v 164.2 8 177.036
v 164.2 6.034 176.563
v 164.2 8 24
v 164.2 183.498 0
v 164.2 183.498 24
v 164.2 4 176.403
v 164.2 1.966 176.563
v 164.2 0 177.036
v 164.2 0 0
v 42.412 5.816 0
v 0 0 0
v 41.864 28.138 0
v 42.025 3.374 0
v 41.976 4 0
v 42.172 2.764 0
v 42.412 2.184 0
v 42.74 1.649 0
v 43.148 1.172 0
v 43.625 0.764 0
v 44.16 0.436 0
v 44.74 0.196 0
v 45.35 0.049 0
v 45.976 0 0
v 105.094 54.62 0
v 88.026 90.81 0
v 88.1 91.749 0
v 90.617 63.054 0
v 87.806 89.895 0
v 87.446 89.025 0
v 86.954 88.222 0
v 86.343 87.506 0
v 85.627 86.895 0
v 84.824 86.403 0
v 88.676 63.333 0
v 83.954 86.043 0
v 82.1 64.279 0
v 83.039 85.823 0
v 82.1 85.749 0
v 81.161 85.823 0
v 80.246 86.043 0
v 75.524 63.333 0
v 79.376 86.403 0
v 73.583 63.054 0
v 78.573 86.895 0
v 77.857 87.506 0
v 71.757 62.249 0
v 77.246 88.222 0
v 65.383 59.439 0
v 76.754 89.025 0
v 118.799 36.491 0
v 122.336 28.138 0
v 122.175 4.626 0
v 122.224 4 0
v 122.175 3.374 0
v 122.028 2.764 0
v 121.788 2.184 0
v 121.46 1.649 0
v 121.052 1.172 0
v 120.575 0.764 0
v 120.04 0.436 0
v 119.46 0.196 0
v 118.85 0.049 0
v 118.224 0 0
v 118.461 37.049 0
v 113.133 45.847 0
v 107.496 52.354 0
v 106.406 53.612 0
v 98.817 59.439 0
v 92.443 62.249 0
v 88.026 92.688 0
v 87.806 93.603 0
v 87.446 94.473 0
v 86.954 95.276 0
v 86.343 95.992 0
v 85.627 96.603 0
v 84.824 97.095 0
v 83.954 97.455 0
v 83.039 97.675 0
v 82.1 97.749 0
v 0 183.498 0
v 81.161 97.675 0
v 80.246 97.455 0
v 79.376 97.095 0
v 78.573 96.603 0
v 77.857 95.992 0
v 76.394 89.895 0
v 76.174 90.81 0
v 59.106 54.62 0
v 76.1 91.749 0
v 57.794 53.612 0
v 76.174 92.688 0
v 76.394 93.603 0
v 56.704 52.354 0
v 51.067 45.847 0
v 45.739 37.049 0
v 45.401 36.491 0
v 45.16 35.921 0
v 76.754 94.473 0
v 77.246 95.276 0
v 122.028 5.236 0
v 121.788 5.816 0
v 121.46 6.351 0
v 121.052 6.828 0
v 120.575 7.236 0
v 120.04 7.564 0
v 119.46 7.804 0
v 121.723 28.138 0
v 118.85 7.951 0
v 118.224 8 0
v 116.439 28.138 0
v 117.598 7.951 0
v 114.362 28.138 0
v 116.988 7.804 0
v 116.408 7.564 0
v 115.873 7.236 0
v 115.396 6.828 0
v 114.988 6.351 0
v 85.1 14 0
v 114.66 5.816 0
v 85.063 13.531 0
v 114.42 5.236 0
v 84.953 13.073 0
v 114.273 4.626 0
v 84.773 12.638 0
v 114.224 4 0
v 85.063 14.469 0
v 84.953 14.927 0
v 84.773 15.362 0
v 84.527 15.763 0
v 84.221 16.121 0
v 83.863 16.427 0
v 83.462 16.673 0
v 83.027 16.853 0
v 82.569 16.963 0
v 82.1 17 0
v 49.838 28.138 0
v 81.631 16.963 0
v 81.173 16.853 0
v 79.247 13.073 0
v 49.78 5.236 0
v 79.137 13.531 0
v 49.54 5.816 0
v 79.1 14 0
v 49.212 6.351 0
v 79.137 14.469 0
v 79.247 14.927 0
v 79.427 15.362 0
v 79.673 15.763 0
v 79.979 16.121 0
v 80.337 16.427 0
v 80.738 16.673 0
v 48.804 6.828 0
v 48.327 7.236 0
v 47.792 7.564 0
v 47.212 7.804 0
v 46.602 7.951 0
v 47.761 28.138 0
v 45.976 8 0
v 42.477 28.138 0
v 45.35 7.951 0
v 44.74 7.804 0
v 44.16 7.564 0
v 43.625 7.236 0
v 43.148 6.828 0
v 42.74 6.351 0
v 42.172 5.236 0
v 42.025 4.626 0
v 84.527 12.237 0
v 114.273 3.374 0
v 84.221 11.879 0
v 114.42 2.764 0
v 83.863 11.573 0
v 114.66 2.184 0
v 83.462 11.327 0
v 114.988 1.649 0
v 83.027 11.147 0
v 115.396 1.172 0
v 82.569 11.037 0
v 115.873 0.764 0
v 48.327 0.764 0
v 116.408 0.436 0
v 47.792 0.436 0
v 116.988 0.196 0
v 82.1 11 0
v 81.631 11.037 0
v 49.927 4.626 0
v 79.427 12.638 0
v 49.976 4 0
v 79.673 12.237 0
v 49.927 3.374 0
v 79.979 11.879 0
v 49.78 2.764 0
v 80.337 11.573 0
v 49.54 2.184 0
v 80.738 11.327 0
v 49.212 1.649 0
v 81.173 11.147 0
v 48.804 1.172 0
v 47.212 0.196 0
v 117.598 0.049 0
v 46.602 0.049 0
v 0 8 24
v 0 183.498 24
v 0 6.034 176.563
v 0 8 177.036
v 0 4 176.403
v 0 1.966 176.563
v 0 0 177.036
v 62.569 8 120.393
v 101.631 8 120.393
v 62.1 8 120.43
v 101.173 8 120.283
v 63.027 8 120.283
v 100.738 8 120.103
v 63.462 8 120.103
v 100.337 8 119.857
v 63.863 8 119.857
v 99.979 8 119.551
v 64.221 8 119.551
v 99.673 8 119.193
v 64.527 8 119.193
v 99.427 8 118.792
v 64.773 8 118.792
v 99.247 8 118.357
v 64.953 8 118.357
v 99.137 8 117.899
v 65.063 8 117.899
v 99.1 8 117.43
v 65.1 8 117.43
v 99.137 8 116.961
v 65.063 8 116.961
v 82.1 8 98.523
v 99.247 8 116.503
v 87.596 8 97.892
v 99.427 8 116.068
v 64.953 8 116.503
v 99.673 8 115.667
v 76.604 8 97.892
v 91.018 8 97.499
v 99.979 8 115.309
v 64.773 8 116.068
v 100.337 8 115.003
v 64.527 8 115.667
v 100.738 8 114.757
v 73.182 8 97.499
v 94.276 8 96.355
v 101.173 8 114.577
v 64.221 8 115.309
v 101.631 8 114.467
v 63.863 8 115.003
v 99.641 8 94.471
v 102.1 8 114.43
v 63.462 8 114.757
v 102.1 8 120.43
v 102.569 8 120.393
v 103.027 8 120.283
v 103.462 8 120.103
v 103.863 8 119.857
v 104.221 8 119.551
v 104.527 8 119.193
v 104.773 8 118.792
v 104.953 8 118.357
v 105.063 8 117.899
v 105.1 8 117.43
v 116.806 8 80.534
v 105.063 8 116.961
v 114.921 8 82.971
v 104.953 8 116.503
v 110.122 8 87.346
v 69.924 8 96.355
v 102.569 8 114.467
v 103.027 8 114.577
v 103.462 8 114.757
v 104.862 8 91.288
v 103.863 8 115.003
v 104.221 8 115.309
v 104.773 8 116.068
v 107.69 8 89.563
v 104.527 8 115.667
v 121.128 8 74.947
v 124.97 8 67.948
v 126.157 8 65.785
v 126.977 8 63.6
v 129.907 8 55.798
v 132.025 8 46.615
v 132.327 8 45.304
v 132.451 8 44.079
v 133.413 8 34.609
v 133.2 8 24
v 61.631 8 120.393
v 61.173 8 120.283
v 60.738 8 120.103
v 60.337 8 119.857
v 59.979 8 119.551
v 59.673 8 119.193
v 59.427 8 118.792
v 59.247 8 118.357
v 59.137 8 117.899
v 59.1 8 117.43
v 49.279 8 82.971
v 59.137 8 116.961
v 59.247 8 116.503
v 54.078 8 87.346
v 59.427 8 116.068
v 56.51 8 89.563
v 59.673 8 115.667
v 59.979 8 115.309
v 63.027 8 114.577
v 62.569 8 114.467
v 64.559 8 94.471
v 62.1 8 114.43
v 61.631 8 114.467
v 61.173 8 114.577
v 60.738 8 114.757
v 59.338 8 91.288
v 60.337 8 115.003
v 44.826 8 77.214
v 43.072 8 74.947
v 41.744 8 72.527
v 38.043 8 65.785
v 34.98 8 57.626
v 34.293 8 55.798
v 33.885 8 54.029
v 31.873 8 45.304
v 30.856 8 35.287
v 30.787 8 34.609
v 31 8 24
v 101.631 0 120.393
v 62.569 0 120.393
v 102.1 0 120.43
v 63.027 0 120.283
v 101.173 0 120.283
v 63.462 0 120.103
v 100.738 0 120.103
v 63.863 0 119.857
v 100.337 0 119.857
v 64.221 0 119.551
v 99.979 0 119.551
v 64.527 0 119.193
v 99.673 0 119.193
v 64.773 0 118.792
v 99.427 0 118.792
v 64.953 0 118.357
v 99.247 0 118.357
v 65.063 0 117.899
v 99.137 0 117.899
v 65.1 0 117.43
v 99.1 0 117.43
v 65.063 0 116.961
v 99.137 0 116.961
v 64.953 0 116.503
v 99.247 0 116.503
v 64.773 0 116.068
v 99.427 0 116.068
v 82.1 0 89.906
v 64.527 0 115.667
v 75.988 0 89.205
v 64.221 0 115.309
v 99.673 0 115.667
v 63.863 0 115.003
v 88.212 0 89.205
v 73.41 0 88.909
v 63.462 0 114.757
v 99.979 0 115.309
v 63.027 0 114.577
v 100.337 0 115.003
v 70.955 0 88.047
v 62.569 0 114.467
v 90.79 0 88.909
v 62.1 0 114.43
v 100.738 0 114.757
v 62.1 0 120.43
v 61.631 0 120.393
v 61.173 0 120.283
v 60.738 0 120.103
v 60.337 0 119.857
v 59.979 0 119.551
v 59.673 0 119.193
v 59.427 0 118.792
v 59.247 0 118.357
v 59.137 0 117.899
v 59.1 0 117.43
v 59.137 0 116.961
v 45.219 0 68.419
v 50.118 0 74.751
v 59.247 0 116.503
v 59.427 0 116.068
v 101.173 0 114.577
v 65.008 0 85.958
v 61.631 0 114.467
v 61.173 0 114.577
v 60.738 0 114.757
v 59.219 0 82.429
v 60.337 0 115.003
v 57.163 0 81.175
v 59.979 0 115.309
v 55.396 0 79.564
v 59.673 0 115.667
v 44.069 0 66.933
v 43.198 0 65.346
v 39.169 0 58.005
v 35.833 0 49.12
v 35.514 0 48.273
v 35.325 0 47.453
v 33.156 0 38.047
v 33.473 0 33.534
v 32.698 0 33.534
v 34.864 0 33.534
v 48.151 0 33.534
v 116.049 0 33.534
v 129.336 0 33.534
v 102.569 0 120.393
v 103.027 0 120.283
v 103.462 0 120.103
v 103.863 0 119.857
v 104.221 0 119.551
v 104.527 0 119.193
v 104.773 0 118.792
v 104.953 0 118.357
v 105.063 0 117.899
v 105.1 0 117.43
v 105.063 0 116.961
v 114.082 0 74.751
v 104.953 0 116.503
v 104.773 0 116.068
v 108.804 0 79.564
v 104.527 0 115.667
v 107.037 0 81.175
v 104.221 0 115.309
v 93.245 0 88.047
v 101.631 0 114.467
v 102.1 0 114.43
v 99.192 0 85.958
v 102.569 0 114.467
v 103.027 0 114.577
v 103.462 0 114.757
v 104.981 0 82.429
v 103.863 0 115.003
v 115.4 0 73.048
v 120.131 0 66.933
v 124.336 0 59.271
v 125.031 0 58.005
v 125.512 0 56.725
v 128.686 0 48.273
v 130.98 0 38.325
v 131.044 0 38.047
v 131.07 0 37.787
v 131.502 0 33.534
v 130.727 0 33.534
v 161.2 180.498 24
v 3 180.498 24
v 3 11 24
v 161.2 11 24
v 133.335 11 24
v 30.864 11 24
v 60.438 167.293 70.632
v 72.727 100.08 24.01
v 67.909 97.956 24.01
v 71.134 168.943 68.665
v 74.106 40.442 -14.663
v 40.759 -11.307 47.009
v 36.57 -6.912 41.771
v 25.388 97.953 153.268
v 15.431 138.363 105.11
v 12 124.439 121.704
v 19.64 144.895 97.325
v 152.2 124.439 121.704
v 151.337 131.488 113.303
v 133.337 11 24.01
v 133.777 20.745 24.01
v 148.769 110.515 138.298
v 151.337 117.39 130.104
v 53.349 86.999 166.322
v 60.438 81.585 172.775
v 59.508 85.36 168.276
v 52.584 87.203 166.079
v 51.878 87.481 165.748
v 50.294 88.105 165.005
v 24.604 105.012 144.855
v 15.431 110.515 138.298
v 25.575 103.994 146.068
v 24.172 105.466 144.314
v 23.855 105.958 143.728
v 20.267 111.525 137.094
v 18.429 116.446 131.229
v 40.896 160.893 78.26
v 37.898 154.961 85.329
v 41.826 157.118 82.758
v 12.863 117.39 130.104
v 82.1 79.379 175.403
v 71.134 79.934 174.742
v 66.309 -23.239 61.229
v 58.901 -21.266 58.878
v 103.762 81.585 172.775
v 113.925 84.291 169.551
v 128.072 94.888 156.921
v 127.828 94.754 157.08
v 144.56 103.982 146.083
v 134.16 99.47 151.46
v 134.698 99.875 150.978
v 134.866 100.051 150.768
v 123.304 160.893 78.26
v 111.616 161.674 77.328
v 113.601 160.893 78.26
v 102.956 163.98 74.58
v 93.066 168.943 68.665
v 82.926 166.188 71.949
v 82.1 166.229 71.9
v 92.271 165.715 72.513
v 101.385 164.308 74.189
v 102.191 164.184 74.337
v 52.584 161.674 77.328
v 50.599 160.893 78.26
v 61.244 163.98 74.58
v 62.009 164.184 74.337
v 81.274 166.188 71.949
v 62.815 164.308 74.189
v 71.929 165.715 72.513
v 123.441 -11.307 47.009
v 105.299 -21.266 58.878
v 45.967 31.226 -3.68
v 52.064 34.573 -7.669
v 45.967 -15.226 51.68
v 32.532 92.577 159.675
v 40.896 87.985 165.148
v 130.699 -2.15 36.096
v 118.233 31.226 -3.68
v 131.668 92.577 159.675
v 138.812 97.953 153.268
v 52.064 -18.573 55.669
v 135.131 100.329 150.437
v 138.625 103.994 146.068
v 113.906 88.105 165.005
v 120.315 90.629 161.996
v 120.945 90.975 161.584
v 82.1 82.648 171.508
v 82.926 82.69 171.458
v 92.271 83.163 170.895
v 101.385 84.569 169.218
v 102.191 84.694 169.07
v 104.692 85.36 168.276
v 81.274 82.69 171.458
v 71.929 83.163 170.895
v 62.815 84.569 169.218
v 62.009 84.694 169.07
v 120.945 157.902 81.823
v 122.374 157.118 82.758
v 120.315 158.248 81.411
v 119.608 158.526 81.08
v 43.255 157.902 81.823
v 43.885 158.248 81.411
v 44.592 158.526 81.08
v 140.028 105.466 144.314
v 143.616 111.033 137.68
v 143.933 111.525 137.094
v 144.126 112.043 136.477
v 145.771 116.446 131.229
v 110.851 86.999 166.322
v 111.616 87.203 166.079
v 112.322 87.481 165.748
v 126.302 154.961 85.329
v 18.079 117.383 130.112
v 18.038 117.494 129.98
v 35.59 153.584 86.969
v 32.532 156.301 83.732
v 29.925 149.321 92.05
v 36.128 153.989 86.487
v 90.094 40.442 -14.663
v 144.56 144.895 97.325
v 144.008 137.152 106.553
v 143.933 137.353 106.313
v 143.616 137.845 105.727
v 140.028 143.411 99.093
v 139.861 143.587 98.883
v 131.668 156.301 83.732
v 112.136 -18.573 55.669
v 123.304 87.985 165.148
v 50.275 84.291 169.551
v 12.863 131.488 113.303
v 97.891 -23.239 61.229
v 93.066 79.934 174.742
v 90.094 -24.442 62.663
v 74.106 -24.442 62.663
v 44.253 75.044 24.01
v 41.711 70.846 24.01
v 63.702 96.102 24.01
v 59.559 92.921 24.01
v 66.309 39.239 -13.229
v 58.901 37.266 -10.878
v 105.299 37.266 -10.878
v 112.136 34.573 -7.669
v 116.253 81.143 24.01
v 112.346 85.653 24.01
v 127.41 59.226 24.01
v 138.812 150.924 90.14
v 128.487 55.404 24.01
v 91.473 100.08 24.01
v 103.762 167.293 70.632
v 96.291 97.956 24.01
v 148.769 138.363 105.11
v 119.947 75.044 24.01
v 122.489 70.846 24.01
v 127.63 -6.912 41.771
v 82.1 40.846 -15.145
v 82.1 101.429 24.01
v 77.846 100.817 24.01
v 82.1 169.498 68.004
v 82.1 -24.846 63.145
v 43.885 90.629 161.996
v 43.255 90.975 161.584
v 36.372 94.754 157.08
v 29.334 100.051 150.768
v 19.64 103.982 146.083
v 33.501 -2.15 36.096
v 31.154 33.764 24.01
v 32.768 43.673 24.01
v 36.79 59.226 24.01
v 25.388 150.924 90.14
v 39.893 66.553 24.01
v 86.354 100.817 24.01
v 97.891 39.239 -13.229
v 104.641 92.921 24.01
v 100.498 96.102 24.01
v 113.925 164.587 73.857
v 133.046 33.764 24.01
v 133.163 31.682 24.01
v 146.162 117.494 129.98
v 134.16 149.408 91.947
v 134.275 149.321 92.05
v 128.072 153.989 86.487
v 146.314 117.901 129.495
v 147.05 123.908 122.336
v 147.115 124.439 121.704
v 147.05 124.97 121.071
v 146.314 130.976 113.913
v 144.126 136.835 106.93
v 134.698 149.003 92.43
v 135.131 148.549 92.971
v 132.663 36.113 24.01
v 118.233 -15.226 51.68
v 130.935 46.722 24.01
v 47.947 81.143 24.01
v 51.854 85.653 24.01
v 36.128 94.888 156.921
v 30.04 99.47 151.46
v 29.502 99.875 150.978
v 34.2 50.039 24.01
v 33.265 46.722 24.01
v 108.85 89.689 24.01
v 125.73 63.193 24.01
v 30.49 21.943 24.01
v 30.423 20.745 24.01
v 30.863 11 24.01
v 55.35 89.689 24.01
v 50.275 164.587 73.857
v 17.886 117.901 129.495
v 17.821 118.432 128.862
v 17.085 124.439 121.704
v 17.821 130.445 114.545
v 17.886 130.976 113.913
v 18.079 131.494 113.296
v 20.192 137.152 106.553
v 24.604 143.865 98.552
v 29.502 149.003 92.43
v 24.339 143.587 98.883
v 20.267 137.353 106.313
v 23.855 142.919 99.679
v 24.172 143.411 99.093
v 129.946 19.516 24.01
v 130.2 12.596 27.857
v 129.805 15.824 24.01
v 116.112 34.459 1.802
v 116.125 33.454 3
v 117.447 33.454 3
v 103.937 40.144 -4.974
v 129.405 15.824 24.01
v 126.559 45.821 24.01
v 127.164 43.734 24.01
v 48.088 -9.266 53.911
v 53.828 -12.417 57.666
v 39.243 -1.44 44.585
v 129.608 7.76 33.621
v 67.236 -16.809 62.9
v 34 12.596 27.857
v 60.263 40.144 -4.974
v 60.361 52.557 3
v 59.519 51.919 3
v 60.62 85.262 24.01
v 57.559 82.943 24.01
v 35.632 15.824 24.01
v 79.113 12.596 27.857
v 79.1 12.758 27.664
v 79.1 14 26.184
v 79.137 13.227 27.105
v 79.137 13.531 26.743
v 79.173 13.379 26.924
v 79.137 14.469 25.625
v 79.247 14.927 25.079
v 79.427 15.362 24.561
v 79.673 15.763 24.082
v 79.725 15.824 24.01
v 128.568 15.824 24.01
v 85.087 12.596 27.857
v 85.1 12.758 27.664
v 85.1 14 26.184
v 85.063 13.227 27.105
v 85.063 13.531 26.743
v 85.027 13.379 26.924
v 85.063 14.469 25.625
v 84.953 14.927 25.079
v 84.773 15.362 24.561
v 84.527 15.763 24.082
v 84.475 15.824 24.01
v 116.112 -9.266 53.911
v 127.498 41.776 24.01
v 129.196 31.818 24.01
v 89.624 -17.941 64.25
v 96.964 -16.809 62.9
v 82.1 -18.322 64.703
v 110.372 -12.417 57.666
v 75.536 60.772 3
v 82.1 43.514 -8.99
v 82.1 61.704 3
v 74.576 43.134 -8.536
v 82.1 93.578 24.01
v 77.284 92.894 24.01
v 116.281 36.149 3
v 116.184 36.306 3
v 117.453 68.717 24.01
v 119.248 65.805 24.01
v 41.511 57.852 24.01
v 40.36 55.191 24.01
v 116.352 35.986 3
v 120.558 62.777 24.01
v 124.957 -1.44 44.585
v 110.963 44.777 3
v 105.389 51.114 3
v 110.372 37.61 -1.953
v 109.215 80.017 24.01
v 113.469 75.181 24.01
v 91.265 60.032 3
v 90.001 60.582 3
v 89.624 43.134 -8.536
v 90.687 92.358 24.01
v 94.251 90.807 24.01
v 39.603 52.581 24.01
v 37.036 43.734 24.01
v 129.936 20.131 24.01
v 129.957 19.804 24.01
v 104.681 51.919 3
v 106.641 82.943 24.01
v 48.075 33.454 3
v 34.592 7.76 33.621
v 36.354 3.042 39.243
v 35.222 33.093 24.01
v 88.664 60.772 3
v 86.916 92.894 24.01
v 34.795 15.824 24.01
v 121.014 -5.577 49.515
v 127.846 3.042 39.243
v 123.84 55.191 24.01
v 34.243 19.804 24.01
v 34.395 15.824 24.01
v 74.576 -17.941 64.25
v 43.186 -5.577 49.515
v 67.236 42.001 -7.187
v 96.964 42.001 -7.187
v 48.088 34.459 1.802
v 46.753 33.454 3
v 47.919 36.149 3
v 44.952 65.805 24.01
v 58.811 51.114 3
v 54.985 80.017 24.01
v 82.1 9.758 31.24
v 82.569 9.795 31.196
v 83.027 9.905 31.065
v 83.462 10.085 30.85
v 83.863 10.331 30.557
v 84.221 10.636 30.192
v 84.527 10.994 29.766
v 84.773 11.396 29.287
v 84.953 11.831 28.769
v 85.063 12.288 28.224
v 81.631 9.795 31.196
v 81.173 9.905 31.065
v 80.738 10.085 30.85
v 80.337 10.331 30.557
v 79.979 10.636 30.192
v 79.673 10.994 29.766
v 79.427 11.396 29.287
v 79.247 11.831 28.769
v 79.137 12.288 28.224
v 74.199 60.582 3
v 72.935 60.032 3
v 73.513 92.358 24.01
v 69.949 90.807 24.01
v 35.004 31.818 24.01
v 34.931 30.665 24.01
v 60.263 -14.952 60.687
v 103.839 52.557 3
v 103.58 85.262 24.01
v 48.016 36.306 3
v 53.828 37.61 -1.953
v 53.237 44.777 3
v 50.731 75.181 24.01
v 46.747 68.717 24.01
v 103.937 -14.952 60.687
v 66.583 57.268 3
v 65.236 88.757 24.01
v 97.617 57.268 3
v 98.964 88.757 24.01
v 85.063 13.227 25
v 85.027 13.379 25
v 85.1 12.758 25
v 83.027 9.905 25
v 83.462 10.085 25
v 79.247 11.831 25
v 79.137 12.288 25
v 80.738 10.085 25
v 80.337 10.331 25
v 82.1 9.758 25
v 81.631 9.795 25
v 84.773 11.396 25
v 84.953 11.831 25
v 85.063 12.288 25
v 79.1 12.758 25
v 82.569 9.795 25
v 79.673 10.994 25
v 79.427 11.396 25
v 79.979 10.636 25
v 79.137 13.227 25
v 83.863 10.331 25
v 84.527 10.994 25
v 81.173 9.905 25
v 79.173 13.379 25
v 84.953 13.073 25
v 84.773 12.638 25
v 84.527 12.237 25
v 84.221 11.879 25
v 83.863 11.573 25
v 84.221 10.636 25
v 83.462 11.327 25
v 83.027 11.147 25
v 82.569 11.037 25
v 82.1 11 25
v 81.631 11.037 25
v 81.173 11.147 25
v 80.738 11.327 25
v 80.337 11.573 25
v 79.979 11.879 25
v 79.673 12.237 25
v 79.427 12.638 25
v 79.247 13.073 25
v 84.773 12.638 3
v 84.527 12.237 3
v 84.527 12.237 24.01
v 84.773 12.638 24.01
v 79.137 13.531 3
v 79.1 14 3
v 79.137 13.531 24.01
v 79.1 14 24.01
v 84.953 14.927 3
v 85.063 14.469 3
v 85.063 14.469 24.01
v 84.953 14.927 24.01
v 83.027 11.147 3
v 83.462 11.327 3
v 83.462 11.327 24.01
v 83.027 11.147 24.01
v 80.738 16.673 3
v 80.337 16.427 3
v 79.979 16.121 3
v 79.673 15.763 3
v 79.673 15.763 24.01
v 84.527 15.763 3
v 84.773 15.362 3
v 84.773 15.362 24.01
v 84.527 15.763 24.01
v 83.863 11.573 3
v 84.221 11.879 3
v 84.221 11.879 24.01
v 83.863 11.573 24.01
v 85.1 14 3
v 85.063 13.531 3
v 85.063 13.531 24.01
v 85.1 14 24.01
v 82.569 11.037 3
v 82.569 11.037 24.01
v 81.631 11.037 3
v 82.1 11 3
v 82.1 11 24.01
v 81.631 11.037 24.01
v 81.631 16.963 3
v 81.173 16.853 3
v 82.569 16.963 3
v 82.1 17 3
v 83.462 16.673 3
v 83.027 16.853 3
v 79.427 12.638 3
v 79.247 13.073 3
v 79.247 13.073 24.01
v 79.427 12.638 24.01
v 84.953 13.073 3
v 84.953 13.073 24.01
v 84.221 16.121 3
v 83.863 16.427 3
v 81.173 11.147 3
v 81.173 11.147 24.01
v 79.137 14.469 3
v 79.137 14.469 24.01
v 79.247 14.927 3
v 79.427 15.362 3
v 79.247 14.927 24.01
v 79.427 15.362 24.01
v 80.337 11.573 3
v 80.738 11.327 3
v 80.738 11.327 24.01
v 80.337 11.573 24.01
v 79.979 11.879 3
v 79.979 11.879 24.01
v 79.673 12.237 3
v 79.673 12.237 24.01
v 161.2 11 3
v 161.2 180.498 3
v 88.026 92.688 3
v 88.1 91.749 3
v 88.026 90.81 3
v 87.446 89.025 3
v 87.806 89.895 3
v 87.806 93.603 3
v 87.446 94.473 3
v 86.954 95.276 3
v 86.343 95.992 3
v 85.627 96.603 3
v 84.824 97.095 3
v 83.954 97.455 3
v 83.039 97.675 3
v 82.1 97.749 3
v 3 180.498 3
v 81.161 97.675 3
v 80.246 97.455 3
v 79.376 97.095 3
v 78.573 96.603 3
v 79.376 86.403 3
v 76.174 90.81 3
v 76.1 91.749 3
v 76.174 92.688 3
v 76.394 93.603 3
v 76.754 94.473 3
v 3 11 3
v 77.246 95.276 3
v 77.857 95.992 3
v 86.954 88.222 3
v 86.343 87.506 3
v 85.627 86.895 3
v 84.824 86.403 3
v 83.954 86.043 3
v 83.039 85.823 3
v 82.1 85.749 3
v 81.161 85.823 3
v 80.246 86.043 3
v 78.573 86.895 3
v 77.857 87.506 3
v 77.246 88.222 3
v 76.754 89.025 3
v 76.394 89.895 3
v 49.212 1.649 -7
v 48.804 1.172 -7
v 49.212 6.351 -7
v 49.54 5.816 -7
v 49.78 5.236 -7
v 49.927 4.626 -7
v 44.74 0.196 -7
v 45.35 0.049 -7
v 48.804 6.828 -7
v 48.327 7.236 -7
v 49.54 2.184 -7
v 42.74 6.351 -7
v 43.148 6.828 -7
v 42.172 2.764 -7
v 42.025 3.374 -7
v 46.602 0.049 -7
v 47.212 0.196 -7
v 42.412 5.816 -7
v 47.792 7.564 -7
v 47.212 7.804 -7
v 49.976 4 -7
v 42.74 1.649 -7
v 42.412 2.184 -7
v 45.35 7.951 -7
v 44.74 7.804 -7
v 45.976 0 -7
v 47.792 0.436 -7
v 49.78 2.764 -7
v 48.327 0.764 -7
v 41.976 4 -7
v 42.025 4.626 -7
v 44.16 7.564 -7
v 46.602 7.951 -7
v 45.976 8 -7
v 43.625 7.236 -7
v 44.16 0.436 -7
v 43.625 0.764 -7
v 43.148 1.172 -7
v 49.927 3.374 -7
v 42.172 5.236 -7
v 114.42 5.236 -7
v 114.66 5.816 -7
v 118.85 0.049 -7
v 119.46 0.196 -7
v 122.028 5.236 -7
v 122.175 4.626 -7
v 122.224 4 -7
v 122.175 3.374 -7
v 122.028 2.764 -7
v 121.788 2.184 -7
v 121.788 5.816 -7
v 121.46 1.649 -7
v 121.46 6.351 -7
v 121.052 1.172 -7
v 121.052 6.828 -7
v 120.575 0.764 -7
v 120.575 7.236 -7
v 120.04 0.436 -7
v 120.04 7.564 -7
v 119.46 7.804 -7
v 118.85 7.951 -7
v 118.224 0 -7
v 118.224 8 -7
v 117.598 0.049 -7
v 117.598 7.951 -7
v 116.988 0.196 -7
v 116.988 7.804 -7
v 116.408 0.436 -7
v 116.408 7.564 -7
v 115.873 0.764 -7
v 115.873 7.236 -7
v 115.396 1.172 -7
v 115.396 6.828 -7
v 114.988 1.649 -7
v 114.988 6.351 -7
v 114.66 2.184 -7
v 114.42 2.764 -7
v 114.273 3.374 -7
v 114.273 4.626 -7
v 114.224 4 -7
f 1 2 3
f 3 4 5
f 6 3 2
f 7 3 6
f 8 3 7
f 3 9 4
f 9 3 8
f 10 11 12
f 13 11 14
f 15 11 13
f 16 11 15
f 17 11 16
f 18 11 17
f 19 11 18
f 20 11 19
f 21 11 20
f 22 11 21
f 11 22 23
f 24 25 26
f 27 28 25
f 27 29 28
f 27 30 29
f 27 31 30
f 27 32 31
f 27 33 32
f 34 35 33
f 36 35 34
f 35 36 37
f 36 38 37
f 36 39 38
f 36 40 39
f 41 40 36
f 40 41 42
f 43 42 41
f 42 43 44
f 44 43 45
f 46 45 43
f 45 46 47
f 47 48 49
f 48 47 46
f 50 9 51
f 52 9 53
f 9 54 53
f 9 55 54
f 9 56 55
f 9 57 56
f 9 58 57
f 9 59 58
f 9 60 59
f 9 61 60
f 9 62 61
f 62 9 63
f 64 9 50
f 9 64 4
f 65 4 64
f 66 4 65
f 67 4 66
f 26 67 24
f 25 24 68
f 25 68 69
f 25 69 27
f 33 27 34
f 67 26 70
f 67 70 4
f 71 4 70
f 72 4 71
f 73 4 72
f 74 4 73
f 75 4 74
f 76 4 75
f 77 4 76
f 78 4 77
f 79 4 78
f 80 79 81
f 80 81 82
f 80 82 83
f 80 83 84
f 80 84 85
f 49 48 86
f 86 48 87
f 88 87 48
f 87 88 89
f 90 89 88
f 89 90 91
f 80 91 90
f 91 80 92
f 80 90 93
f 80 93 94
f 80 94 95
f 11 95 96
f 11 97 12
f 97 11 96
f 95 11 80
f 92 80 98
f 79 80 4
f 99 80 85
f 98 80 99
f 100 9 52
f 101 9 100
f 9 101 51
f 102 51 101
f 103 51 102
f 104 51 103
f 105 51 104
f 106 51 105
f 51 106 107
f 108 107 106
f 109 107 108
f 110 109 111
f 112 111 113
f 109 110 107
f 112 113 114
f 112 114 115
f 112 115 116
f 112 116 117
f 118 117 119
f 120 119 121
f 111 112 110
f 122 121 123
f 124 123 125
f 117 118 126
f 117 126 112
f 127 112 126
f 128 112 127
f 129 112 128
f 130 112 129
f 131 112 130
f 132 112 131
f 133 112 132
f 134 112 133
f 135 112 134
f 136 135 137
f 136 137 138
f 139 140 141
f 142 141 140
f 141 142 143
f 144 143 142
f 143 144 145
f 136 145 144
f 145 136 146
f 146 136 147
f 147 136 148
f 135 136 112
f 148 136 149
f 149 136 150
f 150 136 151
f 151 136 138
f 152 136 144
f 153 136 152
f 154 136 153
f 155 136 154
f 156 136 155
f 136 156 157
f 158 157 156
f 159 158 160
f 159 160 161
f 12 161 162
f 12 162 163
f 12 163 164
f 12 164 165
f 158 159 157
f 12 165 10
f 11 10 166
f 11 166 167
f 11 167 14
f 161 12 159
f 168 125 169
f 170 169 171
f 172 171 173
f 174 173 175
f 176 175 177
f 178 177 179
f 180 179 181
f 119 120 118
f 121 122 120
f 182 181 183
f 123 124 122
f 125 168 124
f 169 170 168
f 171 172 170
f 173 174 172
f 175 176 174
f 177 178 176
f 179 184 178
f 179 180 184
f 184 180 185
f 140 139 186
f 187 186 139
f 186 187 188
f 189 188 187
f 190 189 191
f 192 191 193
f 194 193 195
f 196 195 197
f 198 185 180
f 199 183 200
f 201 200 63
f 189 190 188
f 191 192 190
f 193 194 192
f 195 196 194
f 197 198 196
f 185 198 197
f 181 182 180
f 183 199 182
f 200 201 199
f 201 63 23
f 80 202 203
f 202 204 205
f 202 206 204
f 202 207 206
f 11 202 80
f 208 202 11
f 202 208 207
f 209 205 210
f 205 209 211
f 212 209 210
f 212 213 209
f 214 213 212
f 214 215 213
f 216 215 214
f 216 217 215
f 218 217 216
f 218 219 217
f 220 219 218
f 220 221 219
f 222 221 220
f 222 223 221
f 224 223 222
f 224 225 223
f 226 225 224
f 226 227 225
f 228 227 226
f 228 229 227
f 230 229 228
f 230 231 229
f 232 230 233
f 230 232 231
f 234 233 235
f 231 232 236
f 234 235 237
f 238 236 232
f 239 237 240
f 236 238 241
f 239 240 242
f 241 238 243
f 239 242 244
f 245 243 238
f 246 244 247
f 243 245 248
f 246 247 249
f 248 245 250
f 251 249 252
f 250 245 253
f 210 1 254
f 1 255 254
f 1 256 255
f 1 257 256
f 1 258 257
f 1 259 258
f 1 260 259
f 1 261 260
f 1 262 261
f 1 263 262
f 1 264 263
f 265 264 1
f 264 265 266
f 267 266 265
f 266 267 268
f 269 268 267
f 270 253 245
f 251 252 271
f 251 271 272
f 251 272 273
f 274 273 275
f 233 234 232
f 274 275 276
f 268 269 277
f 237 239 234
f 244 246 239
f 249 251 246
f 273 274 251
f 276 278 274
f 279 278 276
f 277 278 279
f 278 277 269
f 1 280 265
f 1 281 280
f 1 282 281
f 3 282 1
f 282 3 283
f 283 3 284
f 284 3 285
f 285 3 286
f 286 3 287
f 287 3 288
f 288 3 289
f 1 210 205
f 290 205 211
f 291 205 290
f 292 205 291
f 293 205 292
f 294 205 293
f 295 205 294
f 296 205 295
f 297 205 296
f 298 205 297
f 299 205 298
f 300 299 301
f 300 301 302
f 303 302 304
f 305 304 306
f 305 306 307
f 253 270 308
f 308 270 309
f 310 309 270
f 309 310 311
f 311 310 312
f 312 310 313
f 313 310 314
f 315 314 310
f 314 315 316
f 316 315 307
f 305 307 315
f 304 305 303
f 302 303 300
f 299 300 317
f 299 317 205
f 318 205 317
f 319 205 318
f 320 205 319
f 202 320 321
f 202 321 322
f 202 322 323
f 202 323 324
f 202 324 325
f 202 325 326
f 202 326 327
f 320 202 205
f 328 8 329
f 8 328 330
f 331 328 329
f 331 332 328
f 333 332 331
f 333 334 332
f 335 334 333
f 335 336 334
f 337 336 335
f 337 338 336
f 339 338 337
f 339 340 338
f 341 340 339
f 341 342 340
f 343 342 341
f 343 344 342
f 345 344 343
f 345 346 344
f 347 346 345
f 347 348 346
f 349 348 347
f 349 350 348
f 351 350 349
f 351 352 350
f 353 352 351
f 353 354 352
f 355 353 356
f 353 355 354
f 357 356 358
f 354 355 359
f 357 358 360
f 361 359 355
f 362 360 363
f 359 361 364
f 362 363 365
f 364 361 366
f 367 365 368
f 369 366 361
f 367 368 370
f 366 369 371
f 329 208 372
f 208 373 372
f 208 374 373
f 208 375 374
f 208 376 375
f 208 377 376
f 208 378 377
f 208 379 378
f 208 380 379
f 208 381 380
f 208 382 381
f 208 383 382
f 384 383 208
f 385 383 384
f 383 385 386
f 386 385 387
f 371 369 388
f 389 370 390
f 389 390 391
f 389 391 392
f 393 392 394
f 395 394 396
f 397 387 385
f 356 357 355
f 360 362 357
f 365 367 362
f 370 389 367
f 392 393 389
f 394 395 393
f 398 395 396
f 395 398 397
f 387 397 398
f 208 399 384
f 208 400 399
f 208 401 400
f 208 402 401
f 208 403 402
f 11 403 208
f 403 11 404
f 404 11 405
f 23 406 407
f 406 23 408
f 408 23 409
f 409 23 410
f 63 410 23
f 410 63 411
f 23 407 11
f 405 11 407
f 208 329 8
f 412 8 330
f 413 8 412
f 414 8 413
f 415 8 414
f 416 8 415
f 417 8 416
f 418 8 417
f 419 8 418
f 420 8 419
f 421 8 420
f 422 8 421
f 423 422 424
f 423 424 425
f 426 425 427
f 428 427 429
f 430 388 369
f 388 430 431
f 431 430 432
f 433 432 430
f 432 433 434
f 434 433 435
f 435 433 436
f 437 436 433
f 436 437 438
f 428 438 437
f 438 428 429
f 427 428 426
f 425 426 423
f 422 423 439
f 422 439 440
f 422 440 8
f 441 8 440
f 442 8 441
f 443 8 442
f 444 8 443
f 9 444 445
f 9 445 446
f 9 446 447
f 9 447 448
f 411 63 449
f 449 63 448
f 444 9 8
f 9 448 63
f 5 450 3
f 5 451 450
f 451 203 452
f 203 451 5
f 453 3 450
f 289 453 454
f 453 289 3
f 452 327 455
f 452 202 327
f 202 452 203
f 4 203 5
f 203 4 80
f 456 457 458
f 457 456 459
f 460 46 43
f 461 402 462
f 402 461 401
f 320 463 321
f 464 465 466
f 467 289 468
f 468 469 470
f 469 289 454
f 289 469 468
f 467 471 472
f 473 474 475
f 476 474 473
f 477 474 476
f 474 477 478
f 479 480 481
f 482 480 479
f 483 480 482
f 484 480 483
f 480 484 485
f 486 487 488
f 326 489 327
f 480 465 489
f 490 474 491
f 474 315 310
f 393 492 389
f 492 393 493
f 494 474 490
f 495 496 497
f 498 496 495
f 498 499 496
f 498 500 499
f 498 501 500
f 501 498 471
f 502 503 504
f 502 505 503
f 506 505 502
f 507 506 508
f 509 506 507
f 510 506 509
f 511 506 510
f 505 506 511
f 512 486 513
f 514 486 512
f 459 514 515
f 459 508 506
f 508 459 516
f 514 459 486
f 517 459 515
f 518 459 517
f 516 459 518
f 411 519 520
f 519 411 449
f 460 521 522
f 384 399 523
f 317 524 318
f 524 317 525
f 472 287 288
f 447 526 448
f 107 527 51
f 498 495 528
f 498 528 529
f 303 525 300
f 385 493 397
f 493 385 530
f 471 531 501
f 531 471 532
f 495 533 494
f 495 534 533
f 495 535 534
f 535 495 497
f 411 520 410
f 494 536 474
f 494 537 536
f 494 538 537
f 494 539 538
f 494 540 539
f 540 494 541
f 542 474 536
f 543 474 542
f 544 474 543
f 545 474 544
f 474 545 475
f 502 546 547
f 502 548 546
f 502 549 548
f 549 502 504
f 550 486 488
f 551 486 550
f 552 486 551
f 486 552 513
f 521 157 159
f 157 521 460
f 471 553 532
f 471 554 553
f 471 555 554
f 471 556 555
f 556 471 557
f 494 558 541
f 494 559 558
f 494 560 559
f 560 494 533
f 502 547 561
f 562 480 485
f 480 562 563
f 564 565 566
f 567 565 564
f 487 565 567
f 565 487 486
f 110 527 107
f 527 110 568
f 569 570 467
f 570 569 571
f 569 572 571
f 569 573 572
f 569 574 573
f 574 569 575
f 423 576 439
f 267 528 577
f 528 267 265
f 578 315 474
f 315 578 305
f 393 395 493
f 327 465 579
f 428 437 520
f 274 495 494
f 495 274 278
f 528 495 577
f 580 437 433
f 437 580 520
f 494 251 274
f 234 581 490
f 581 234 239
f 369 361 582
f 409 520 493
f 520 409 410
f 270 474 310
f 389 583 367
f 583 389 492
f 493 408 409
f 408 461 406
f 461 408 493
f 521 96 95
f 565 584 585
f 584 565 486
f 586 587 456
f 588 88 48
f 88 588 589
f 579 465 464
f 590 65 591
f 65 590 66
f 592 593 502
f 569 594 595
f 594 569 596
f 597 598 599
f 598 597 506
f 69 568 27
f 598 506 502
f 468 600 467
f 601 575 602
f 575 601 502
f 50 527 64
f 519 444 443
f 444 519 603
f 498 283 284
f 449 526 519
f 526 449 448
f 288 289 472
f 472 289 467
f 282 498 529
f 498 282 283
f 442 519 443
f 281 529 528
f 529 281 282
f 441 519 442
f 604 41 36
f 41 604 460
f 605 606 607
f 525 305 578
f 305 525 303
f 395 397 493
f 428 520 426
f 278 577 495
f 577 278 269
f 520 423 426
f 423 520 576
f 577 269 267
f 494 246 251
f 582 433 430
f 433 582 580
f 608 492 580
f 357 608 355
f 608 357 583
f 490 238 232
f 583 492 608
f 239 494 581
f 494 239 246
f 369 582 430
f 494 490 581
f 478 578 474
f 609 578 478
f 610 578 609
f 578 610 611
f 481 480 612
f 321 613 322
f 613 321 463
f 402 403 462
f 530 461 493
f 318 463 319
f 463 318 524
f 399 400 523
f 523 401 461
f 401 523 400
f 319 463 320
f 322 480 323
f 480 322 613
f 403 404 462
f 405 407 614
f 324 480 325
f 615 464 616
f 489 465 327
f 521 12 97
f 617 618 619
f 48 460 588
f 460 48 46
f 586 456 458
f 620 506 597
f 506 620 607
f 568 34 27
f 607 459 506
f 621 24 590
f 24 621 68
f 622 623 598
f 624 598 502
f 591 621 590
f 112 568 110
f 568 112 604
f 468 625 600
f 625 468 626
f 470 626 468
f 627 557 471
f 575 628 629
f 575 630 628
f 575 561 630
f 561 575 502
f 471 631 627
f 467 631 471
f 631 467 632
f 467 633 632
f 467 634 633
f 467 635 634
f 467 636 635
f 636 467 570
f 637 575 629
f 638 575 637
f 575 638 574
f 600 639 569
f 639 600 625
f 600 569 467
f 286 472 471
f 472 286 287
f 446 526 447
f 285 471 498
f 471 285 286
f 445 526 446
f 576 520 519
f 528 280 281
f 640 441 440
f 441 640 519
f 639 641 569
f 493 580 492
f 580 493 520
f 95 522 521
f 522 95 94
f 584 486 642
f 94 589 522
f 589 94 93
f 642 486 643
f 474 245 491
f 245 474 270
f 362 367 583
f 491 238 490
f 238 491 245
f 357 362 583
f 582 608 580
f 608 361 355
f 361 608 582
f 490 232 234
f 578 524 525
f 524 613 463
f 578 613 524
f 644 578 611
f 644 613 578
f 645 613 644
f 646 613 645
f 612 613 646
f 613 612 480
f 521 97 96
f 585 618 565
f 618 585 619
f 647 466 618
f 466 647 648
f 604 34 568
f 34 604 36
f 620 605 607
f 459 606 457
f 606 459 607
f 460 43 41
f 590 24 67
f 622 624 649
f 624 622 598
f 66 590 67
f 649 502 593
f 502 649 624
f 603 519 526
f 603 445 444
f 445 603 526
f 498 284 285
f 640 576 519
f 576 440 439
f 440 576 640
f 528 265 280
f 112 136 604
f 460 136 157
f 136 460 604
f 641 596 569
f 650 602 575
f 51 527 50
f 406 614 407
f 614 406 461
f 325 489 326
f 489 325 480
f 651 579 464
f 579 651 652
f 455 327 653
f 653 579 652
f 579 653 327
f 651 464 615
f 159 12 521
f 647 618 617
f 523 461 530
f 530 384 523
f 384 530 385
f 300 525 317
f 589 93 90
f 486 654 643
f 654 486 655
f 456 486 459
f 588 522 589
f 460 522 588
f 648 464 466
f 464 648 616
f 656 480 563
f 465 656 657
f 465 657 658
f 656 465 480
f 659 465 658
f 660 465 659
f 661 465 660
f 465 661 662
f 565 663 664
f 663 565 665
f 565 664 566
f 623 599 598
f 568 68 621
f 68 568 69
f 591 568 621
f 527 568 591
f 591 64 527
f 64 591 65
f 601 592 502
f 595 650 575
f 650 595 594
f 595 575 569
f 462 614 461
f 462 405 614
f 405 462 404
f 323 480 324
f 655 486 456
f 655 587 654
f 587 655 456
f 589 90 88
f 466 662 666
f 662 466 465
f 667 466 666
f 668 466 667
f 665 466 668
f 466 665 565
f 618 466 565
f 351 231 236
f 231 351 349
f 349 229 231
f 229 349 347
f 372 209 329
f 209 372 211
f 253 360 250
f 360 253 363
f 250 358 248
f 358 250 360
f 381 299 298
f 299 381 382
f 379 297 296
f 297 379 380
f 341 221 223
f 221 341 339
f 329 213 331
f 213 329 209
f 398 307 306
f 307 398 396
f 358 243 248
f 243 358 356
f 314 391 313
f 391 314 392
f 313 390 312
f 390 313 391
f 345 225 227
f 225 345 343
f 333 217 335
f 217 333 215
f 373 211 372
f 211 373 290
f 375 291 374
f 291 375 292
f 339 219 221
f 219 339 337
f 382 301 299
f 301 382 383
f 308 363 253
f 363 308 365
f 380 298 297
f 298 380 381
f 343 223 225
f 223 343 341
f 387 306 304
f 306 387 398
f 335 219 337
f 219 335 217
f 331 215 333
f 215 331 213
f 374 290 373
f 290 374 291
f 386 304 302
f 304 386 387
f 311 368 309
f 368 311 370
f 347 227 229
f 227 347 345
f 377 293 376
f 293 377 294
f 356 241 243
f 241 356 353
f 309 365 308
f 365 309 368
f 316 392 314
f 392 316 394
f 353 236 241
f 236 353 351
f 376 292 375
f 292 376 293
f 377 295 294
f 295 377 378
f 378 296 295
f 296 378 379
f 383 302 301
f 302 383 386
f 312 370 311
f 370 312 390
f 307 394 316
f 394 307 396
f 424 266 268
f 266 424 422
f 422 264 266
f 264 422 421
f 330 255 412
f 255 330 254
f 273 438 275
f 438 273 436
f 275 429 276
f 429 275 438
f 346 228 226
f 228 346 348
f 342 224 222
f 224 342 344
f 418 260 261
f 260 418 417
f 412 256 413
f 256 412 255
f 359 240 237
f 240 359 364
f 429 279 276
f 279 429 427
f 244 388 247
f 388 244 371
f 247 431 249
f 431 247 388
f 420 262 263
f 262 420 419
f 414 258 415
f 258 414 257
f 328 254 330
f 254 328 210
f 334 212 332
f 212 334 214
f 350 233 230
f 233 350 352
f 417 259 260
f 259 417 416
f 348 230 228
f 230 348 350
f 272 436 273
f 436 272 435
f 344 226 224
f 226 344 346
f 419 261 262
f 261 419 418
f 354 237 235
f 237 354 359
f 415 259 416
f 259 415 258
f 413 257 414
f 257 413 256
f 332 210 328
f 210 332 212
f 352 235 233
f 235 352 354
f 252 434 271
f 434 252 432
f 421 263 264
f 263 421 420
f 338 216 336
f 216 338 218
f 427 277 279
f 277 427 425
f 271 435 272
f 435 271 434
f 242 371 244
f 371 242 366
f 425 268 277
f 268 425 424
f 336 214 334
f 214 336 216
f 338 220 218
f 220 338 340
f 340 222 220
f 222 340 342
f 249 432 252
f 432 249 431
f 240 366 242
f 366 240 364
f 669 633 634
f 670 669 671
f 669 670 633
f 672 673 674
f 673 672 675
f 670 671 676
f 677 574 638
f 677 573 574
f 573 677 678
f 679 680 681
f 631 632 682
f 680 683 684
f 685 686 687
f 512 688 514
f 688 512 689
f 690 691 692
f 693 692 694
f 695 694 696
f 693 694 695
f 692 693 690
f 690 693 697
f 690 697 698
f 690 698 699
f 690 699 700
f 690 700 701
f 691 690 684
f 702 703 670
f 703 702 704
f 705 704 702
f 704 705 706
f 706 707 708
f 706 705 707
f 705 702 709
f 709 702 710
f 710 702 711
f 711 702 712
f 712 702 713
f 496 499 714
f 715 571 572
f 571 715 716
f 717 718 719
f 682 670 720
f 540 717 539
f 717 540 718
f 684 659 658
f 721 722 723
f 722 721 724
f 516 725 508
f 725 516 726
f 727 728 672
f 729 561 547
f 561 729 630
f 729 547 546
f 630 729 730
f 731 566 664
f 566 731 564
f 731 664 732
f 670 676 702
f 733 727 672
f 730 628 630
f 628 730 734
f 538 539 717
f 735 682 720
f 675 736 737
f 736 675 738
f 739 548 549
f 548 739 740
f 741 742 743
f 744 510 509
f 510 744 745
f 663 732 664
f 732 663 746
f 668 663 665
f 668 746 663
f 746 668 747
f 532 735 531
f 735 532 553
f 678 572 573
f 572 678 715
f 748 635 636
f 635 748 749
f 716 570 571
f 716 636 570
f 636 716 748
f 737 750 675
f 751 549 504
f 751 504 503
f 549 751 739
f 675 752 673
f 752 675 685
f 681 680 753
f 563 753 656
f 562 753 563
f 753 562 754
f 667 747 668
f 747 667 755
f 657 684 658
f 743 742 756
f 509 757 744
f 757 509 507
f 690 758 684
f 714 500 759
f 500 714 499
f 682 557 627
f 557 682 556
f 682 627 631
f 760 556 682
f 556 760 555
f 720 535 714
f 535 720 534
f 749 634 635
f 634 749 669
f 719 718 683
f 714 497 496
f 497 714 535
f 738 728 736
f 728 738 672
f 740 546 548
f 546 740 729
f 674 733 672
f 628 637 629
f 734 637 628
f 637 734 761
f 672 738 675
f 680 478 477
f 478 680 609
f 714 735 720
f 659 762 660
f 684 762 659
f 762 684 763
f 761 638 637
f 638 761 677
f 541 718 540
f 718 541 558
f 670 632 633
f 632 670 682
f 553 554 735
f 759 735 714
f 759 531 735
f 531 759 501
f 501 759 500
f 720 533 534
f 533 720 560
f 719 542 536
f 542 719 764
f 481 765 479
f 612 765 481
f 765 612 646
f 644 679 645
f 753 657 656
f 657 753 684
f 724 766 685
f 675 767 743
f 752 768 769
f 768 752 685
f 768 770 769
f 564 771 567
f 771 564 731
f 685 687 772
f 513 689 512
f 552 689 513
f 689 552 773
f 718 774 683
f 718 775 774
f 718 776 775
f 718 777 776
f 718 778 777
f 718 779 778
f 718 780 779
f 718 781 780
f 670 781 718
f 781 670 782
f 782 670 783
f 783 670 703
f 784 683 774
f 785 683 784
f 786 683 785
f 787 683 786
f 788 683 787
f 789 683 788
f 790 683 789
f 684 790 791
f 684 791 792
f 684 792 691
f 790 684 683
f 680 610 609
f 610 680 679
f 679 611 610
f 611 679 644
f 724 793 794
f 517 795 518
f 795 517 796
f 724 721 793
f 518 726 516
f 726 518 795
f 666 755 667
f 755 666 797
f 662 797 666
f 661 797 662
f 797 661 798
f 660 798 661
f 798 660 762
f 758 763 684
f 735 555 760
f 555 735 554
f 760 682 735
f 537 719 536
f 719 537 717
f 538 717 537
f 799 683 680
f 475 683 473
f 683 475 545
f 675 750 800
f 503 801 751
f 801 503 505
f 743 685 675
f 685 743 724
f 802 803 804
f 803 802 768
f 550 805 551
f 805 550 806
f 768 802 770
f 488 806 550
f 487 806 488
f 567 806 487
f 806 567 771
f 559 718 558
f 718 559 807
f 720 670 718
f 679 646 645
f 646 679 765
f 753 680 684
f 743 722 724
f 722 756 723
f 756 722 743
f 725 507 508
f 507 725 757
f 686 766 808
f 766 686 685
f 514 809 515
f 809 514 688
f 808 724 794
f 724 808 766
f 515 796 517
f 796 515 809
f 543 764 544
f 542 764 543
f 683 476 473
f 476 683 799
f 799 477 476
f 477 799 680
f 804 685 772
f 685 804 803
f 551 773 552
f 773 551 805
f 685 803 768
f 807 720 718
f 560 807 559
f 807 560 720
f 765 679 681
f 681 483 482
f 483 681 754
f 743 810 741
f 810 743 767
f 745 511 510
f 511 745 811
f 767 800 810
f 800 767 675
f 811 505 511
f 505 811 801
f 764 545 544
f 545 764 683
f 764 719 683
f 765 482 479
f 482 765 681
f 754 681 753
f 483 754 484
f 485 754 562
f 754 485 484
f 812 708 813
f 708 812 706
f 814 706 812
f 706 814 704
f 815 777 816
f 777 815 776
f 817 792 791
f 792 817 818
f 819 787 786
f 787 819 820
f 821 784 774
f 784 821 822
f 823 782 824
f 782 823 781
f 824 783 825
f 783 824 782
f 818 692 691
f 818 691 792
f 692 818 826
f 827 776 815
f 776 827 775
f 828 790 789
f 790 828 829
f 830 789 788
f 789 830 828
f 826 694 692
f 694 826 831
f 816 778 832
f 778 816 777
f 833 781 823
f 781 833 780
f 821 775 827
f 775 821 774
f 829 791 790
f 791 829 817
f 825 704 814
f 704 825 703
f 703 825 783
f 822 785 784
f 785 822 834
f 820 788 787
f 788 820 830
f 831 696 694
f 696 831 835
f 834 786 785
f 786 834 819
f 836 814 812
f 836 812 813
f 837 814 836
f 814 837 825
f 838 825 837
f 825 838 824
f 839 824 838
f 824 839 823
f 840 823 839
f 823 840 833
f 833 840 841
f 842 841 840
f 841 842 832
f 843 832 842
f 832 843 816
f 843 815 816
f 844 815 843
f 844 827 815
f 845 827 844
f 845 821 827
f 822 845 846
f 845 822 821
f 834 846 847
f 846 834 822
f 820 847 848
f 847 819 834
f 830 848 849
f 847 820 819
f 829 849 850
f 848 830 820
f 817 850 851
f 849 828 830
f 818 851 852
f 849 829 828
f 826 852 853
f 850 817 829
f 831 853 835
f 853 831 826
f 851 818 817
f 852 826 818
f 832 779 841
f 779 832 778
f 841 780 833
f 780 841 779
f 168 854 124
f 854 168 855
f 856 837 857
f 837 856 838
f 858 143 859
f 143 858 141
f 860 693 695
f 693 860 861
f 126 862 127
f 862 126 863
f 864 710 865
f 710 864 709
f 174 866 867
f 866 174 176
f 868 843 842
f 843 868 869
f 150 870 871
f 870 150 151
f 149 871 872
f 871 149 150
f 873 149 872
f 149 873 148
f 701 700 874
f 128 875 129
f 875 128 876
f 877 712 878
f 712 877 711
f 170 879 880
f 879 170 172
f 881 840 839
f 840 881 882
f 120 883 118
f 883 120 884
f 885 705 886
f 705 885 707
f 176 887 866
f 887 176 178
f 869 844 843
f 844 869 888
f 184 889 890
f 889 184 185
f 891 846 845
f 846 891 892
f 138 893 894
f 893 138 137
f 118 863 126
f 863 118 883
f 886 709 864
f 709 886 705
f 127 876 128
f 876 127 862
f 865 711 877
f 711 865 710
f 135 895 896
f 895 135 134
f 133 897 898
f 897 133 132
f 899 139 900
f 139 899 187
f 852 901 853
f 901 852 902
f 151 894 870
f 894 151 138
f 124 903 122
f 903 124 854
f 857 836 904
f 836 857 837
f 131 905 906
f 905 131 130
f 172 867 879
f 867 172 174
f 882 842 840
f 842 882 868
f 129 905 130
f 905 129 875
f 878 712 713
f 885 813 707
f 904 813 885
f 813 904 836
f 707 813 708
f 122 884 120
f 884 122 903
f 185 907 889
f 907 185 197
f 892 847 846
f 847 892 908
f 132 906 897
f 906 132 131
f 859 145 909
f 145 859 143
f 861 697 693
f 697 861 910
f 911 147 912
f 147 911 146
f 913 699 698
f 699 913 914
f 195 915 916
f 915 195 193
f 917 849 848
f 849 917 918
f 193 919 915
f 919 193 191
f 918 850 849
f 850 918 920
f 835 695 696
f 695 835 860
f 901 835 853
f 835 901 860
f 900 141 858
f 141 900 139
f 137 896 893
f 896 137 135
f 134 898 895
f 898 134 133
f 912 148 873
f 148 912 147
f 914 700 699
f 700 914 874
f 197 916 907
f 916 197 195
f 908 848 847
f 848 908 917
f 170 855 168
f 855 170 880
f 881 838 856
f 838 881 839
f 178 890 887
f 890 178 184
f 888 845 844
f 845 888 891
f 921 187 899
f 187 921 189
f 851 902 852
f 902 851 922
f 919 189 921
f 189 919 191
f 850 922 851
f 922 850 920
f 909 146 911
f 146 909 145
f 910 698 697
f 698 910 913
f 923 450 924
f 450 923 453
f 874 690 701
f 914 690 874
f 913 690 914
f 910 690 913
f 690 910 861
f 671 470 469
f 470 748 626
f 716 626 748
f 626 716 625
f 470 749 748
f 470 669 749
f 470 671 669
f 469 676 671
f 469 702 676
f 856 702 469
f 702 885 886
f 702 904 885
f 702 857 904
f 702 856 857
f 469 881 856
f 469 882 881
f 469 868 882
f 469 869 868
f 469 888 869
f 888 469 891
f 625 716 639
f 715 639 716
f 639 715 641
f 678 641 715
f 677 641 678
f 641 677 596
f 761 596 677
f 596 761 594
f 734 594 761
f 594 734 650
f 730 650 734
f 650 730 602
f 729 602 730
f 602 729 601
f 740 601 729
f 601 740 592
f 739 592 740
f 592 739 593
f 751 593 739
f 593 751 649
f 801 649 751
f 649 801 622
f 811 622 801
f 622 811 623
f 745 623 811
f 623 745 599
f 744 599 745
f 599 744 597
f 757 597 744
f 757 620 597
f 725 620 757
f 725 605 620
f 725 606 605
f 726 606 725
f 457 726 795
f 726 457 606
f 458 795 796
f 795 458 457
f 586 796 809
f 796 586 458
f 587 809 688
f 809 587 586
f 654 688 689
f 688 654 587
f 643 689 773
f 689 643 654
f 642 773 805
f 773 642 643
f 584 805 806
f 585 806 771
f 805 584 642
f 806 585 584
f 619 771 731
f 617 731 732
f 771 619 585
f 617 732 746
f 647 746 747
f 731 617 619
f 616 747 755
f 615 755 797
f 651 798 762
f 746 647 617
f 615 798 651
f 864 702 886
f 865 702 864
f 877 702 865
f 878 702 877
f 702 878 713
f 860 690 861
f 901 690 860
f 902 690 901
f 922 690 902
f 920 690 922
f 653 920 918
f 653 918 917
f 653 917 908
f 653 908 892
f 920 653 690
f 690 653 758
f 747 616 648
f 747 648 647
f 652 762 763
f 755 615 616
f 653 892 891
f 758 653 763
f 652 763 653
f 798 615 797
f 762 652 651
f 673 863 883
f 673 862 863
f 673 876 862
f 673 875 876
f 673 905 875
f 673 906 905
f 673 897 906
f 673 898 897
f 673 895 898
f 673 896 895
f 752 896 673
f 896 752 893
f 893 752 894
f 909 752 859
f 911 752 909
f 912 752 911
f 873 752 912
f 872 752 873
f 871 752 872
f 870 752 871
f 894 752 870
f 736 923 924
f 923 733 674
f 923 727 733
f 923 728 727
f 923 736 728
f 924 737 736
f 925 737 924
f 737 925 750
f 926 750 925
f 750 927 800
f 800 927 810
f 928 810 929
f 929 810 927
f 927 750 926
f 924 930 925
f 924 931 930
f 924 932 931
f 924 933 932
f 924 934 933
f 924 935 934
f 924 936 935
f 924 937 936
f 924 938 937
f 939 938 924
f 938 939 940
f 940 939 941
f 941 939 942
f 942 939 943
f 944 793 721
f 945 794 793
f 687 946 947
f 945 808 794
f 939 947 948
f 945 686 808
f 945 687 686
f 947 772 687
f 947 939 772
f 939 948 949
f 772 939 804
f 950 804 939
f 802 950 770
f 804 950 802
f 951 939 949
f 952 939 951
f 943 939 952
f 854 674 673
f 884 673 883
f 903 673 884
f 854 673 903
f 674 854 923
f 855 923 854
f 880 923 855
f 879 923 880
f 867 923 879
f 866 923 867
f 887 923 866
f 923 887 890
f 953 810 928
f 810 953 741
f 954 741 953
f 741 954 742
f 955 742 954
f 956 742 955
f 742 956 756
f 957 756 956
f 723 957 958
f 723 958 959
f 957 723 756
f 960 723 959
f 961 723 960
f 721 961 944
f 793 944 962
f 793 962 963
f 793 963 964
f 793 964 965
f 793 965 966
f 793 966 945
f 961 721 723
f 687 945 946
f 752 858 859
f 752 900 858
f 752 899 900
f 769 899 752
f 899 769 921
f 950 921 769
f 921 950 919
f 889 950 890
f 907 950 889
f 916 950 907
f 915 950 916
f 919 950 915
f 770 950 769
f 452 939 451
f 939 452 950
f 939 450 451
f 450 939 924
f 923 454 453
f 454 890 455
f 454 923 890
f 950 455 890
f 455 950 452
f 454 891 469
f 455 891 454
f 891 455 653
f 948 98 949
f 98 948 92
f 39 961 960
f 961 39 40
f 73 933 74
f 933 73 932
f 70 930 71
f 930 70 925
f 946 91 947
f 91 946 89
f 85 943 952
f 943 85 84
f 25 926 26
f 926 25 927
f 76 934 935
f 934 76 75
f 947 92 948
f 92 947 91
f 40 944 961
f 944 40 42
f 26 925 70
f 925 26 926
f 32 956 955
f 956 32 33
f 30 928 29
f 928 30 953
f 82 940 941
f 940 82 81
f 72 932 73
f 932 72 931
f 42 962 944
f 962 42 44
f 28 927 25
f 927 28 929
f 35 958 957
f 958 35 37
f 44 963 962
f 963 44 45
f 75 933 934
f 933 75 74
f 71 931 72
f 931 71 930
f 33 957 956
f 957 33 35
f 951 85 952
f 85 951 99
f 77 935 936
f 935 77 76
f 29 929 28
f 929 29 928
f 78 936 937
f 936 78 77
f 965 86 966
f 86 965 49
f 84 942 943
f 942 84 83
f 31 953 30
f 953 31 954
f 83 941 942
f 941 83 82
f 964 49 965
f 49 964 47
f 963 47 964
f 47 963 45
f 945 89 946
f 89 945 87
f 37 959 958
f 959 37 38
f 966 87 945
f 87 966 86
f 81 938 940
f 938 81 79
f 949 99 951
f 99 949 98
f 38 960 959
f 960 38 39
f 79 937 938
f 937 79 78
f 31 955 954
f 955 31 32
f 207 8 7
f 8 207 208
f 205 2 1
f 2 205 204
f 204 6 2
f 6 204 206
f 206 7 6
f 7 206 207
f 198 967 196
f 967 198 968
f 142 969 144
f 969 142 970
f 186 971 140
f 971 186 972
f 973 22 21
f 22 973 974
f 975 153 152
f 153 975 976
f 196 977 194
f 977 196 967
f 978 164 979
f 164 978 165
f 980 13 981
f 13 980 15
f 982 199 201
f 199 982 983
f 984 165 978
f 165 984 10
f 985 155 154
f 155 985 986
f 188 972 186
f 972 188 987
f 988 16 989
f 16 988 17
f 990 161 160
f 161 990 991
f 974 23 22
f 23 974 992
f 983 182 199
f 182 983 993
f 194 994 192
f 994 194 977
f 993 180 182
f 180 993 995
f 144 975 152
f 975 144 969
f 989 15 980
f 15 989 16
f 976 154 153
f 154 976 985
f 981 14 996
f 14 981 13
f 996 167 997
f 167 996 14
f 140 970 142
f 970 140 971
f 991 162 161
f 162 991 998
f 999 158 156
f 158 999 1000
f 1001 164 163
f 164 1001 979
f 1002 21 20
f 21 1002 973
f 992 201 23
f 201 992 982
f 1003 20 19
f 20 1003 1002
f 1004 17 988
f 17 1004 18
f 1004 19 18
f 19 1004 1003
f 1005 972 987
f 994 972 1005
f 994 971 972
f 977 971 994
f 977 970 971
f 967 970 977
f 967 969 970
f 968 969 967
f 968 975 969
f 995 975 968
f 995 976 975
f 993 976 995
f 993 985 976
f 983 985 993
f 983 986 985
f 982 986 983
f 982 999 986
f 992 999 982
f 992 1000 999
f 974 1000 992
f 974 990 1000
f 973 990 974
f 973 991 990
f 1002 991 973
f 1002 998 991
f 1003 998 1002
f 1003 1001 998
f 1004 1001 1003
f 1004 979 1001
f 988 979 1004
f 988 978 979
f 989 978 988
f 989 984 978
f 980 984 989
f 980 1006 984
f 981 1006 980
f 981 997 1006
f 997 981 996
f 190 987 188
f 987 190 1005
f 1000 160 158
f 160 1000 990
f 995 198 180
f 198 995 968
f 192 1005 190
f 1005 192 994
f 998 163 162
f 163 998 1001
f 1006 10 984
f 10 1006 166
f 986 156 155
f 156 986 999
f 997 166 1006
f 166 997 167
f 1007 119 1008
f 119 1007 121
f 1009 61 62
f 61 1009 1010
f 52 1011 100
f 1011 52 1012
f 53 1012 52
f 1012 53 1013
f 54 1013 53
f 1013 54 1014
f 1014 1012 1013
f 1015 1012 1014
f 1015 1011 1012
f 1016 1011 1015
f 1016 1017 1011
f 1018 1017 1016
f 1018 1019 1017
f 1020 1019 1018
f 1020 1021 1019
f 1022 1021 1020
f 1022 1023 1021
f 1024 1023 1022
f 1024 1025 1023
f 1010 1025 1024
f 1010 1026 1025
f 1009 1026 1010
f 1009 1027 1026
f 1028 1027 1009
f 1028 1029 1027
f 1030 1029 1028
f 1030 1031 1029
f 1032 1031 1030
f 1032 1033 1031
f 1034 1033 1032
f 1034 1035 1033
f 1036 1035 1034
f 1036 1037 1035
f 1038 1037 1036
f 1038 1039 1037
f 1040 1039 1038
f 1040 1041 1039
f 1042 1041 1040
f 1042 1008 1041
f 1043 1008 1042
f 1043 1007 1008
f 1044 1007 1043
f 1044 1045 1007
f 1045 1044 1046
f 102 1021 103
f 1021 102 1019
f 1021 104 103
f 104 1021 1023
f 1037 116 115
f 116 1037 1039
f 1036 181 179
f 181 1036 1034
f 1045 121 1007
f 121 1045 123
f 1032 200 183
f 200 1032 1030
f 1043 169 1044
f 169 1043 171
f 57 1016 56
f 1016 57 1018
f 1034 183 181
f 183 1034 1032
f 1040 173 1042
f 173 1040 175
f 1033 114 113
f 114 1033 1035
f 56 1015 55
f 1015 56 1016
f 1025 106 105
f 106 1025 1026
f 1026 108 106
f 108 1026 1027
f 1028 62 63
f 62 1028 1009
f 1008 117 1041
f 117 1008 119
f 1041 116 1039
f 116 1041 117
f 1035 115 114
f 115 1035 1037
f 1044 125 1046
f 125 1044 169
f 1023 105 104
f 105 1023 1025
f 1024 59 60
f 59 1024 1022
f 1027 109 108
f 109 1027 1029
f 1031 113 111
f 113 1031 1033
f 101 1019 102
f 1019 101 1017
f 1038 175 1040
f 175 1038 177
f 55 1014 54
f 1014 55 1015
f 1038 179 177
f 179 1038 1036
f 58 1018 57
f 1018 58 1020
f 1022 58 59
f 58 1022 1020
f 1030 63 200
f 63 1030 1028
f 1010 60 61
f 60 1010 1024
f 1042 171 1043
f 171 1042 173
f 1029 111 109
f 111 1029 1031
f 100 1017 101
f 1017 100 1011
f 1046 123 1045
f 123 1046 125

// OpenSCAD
// =====================================================================
//  墙面种植单元 v3 — 正确形态: 薄背板 + 前伸斜置中空杯体 + 底部储水盒
//  对标剖面图: 杯体是露在外的管状件(有壁厚), 非实心块挖洞
//  拓竹P2S: 单元三维 ≤ 240mm | 仅堆叠 | 逐层淌水 | 可拆锥形盆
// =====================================================================

/* [可拆花盆外形 -> 腔体按此+间隙] */
pot_top_d = 131.2;   // 盆上口外径
pot_bot_d = 93.2;    // 盆底外径
pot_height= 148;     // 盆高
fit_clear = 1.5;     // 单边间隙

/* [杯体/壁] */
tilt      = 40;      // 杯轴高于水平的角度(越大开口越朝上)
wall      = 3.0;     // 杯壁/箱壁厚
floor_t   = 6;       // 杯底厚(承盆)
mouth_ext = 18;      // 开口端外伸(确保杯口完整张开)

/* [背板/储水盒] */
panel_t   = 8;       // 背板厚
res_h     = 24;      // 储水盒高
side_gap  = 12;      // 杯体两侧到边距

/* [灌溉/孔] */
drain_d   = 6;       // 杯底排水孔(->储水盒)
overflow_d= 12;      // 储水盒溢流孔(->下层, 底层可塞堵塞)
vent_d    = 6;       // 透气孔
vent_n    = 2;

/* [堆叠定位] */
peg_d     = 8;
peg_clear = 0.3;

dev = true;
$fn = dev ? 40 : 96;

// ---- 派生 ----------------------------------------------------------
in_bot  = pot_bot_d + 2*fit_clear;
in_top  = pot_top_d + 2*fit_clear;
out_bot = in_bot + 2*wall;
out_top = in_top + 2*wall;
cup_len = pot_height + 4;
ay = cos(tilt); az = sin(tilt);          // 杯轴方向 (0, ay, az)

mod_w = out_top + 2*side_gap;
cx    = mod_w/2;
base_y = panel_t;                         // 杯底(窄端)贴在背板前
base_z = res_h;                           // 杯底坐在储水盒顶
op_y  = base_y + cup_len*ay;              // 开口中心 Y
op_z  = base_z + cup_len*az;              // 开口中心 Z
mod_d = op_y + (out_top/2)*az + 14;       // 前向总深
mod_h = op_z + (out_top/2)*ay + 14;       // 总高

// 斜置圆台(从局部原点沿杯轴伸出)
module frustum(d1, d2, len) {
    rotate([-(90 - tilt), 0, 0]) cylinder(h = len, d1 = d1, d2 = d2);
}

// ---- 实体 ----------------------------------------------------------
module body() {
    union() {
        // 背板(薄板, 贴墙/堆叠面)
        cube([mod_w, panel_t, mod_h]);
        // 储水盒(底部实体块, 后面掏空)
        cube([mod_w, mod_d, res_h]);
        // 杯体外形(前伸斜圆台实体)
        translate([cx, base_y, base_z]) frustum(out_bot, out_top, cup_len);
    }
}

module unit() {
    difference() {
        body();

        // 1) 掏空杯体内腔(留 floor_t 杯底), 并外伸开口
        translate([cx, base_y + ay*floor_t, base_z + az*floor_t])
            frustum(in_bot, in_top, cup_len - floor_t + mouth_ext);

        // 2) 杯底排水孔 -> 储水盒
        translate([cx, base_y + ay*floor_t*0.6, base_z + 1])
            translate([0, 2, 0]) cylinder(h = base_z + 6, d = drain_d, center=false);
        translate([cx, base_y + 6, -0.5]) cylinder(h = base_z + floor_t + 2, d = drain_d);

        // 3) 储水盒内腔(留壁)
        translate([wall, panel_t + wall, wall])
            cube([mod_w - 2*wall, mod_d - panel_t - 2*wall, res_h - wall + 0.01]);

        // 4) 溢流孔(储水盒底 -> 下层; 底层塞橡胶塞)
        translate([cx, mod_d*0.5, -0.5]) cylinder(h = wall + 1, d = overflow_d);

        // 5) 透气孔(背板上部)
        for (k = [0 : vent_n-1])
            translate([cx - 20 + k*40, -0.5, mod_h*0.62])
                rotate([-90,0,0]) cylinder(h = panel_t + 1, d = vent_d);

        // 6) 背板顶部半圆缺口(让上层水路/透气)
        translate([cx, panel_t/2, mod_h]) rotate([0,90,0])
            cylinder(h = mod_w, d = 26, center=true);

        // 7) 顶面堆叠定位孔
        for (sx = [mod_w*0.28, mod_w*0.72])
            translate([sx, panel_t/2, mod_h - 8]) cylinder(h = 9, d = peg_d + peg_clear);
    }

    // 8) 底面堆叠定位销
    for (sx = [mod_w*0.28, mod_w*0.72])
        translate([sx, panel_t/2, -7]) cylinder(h = 8, d = peg_d);
}

unit();
echo(str("单元 W x D x H = ", mod_w, " x ", mod_d, " x ", mod_h, " mm  (需 ≤240)"));
